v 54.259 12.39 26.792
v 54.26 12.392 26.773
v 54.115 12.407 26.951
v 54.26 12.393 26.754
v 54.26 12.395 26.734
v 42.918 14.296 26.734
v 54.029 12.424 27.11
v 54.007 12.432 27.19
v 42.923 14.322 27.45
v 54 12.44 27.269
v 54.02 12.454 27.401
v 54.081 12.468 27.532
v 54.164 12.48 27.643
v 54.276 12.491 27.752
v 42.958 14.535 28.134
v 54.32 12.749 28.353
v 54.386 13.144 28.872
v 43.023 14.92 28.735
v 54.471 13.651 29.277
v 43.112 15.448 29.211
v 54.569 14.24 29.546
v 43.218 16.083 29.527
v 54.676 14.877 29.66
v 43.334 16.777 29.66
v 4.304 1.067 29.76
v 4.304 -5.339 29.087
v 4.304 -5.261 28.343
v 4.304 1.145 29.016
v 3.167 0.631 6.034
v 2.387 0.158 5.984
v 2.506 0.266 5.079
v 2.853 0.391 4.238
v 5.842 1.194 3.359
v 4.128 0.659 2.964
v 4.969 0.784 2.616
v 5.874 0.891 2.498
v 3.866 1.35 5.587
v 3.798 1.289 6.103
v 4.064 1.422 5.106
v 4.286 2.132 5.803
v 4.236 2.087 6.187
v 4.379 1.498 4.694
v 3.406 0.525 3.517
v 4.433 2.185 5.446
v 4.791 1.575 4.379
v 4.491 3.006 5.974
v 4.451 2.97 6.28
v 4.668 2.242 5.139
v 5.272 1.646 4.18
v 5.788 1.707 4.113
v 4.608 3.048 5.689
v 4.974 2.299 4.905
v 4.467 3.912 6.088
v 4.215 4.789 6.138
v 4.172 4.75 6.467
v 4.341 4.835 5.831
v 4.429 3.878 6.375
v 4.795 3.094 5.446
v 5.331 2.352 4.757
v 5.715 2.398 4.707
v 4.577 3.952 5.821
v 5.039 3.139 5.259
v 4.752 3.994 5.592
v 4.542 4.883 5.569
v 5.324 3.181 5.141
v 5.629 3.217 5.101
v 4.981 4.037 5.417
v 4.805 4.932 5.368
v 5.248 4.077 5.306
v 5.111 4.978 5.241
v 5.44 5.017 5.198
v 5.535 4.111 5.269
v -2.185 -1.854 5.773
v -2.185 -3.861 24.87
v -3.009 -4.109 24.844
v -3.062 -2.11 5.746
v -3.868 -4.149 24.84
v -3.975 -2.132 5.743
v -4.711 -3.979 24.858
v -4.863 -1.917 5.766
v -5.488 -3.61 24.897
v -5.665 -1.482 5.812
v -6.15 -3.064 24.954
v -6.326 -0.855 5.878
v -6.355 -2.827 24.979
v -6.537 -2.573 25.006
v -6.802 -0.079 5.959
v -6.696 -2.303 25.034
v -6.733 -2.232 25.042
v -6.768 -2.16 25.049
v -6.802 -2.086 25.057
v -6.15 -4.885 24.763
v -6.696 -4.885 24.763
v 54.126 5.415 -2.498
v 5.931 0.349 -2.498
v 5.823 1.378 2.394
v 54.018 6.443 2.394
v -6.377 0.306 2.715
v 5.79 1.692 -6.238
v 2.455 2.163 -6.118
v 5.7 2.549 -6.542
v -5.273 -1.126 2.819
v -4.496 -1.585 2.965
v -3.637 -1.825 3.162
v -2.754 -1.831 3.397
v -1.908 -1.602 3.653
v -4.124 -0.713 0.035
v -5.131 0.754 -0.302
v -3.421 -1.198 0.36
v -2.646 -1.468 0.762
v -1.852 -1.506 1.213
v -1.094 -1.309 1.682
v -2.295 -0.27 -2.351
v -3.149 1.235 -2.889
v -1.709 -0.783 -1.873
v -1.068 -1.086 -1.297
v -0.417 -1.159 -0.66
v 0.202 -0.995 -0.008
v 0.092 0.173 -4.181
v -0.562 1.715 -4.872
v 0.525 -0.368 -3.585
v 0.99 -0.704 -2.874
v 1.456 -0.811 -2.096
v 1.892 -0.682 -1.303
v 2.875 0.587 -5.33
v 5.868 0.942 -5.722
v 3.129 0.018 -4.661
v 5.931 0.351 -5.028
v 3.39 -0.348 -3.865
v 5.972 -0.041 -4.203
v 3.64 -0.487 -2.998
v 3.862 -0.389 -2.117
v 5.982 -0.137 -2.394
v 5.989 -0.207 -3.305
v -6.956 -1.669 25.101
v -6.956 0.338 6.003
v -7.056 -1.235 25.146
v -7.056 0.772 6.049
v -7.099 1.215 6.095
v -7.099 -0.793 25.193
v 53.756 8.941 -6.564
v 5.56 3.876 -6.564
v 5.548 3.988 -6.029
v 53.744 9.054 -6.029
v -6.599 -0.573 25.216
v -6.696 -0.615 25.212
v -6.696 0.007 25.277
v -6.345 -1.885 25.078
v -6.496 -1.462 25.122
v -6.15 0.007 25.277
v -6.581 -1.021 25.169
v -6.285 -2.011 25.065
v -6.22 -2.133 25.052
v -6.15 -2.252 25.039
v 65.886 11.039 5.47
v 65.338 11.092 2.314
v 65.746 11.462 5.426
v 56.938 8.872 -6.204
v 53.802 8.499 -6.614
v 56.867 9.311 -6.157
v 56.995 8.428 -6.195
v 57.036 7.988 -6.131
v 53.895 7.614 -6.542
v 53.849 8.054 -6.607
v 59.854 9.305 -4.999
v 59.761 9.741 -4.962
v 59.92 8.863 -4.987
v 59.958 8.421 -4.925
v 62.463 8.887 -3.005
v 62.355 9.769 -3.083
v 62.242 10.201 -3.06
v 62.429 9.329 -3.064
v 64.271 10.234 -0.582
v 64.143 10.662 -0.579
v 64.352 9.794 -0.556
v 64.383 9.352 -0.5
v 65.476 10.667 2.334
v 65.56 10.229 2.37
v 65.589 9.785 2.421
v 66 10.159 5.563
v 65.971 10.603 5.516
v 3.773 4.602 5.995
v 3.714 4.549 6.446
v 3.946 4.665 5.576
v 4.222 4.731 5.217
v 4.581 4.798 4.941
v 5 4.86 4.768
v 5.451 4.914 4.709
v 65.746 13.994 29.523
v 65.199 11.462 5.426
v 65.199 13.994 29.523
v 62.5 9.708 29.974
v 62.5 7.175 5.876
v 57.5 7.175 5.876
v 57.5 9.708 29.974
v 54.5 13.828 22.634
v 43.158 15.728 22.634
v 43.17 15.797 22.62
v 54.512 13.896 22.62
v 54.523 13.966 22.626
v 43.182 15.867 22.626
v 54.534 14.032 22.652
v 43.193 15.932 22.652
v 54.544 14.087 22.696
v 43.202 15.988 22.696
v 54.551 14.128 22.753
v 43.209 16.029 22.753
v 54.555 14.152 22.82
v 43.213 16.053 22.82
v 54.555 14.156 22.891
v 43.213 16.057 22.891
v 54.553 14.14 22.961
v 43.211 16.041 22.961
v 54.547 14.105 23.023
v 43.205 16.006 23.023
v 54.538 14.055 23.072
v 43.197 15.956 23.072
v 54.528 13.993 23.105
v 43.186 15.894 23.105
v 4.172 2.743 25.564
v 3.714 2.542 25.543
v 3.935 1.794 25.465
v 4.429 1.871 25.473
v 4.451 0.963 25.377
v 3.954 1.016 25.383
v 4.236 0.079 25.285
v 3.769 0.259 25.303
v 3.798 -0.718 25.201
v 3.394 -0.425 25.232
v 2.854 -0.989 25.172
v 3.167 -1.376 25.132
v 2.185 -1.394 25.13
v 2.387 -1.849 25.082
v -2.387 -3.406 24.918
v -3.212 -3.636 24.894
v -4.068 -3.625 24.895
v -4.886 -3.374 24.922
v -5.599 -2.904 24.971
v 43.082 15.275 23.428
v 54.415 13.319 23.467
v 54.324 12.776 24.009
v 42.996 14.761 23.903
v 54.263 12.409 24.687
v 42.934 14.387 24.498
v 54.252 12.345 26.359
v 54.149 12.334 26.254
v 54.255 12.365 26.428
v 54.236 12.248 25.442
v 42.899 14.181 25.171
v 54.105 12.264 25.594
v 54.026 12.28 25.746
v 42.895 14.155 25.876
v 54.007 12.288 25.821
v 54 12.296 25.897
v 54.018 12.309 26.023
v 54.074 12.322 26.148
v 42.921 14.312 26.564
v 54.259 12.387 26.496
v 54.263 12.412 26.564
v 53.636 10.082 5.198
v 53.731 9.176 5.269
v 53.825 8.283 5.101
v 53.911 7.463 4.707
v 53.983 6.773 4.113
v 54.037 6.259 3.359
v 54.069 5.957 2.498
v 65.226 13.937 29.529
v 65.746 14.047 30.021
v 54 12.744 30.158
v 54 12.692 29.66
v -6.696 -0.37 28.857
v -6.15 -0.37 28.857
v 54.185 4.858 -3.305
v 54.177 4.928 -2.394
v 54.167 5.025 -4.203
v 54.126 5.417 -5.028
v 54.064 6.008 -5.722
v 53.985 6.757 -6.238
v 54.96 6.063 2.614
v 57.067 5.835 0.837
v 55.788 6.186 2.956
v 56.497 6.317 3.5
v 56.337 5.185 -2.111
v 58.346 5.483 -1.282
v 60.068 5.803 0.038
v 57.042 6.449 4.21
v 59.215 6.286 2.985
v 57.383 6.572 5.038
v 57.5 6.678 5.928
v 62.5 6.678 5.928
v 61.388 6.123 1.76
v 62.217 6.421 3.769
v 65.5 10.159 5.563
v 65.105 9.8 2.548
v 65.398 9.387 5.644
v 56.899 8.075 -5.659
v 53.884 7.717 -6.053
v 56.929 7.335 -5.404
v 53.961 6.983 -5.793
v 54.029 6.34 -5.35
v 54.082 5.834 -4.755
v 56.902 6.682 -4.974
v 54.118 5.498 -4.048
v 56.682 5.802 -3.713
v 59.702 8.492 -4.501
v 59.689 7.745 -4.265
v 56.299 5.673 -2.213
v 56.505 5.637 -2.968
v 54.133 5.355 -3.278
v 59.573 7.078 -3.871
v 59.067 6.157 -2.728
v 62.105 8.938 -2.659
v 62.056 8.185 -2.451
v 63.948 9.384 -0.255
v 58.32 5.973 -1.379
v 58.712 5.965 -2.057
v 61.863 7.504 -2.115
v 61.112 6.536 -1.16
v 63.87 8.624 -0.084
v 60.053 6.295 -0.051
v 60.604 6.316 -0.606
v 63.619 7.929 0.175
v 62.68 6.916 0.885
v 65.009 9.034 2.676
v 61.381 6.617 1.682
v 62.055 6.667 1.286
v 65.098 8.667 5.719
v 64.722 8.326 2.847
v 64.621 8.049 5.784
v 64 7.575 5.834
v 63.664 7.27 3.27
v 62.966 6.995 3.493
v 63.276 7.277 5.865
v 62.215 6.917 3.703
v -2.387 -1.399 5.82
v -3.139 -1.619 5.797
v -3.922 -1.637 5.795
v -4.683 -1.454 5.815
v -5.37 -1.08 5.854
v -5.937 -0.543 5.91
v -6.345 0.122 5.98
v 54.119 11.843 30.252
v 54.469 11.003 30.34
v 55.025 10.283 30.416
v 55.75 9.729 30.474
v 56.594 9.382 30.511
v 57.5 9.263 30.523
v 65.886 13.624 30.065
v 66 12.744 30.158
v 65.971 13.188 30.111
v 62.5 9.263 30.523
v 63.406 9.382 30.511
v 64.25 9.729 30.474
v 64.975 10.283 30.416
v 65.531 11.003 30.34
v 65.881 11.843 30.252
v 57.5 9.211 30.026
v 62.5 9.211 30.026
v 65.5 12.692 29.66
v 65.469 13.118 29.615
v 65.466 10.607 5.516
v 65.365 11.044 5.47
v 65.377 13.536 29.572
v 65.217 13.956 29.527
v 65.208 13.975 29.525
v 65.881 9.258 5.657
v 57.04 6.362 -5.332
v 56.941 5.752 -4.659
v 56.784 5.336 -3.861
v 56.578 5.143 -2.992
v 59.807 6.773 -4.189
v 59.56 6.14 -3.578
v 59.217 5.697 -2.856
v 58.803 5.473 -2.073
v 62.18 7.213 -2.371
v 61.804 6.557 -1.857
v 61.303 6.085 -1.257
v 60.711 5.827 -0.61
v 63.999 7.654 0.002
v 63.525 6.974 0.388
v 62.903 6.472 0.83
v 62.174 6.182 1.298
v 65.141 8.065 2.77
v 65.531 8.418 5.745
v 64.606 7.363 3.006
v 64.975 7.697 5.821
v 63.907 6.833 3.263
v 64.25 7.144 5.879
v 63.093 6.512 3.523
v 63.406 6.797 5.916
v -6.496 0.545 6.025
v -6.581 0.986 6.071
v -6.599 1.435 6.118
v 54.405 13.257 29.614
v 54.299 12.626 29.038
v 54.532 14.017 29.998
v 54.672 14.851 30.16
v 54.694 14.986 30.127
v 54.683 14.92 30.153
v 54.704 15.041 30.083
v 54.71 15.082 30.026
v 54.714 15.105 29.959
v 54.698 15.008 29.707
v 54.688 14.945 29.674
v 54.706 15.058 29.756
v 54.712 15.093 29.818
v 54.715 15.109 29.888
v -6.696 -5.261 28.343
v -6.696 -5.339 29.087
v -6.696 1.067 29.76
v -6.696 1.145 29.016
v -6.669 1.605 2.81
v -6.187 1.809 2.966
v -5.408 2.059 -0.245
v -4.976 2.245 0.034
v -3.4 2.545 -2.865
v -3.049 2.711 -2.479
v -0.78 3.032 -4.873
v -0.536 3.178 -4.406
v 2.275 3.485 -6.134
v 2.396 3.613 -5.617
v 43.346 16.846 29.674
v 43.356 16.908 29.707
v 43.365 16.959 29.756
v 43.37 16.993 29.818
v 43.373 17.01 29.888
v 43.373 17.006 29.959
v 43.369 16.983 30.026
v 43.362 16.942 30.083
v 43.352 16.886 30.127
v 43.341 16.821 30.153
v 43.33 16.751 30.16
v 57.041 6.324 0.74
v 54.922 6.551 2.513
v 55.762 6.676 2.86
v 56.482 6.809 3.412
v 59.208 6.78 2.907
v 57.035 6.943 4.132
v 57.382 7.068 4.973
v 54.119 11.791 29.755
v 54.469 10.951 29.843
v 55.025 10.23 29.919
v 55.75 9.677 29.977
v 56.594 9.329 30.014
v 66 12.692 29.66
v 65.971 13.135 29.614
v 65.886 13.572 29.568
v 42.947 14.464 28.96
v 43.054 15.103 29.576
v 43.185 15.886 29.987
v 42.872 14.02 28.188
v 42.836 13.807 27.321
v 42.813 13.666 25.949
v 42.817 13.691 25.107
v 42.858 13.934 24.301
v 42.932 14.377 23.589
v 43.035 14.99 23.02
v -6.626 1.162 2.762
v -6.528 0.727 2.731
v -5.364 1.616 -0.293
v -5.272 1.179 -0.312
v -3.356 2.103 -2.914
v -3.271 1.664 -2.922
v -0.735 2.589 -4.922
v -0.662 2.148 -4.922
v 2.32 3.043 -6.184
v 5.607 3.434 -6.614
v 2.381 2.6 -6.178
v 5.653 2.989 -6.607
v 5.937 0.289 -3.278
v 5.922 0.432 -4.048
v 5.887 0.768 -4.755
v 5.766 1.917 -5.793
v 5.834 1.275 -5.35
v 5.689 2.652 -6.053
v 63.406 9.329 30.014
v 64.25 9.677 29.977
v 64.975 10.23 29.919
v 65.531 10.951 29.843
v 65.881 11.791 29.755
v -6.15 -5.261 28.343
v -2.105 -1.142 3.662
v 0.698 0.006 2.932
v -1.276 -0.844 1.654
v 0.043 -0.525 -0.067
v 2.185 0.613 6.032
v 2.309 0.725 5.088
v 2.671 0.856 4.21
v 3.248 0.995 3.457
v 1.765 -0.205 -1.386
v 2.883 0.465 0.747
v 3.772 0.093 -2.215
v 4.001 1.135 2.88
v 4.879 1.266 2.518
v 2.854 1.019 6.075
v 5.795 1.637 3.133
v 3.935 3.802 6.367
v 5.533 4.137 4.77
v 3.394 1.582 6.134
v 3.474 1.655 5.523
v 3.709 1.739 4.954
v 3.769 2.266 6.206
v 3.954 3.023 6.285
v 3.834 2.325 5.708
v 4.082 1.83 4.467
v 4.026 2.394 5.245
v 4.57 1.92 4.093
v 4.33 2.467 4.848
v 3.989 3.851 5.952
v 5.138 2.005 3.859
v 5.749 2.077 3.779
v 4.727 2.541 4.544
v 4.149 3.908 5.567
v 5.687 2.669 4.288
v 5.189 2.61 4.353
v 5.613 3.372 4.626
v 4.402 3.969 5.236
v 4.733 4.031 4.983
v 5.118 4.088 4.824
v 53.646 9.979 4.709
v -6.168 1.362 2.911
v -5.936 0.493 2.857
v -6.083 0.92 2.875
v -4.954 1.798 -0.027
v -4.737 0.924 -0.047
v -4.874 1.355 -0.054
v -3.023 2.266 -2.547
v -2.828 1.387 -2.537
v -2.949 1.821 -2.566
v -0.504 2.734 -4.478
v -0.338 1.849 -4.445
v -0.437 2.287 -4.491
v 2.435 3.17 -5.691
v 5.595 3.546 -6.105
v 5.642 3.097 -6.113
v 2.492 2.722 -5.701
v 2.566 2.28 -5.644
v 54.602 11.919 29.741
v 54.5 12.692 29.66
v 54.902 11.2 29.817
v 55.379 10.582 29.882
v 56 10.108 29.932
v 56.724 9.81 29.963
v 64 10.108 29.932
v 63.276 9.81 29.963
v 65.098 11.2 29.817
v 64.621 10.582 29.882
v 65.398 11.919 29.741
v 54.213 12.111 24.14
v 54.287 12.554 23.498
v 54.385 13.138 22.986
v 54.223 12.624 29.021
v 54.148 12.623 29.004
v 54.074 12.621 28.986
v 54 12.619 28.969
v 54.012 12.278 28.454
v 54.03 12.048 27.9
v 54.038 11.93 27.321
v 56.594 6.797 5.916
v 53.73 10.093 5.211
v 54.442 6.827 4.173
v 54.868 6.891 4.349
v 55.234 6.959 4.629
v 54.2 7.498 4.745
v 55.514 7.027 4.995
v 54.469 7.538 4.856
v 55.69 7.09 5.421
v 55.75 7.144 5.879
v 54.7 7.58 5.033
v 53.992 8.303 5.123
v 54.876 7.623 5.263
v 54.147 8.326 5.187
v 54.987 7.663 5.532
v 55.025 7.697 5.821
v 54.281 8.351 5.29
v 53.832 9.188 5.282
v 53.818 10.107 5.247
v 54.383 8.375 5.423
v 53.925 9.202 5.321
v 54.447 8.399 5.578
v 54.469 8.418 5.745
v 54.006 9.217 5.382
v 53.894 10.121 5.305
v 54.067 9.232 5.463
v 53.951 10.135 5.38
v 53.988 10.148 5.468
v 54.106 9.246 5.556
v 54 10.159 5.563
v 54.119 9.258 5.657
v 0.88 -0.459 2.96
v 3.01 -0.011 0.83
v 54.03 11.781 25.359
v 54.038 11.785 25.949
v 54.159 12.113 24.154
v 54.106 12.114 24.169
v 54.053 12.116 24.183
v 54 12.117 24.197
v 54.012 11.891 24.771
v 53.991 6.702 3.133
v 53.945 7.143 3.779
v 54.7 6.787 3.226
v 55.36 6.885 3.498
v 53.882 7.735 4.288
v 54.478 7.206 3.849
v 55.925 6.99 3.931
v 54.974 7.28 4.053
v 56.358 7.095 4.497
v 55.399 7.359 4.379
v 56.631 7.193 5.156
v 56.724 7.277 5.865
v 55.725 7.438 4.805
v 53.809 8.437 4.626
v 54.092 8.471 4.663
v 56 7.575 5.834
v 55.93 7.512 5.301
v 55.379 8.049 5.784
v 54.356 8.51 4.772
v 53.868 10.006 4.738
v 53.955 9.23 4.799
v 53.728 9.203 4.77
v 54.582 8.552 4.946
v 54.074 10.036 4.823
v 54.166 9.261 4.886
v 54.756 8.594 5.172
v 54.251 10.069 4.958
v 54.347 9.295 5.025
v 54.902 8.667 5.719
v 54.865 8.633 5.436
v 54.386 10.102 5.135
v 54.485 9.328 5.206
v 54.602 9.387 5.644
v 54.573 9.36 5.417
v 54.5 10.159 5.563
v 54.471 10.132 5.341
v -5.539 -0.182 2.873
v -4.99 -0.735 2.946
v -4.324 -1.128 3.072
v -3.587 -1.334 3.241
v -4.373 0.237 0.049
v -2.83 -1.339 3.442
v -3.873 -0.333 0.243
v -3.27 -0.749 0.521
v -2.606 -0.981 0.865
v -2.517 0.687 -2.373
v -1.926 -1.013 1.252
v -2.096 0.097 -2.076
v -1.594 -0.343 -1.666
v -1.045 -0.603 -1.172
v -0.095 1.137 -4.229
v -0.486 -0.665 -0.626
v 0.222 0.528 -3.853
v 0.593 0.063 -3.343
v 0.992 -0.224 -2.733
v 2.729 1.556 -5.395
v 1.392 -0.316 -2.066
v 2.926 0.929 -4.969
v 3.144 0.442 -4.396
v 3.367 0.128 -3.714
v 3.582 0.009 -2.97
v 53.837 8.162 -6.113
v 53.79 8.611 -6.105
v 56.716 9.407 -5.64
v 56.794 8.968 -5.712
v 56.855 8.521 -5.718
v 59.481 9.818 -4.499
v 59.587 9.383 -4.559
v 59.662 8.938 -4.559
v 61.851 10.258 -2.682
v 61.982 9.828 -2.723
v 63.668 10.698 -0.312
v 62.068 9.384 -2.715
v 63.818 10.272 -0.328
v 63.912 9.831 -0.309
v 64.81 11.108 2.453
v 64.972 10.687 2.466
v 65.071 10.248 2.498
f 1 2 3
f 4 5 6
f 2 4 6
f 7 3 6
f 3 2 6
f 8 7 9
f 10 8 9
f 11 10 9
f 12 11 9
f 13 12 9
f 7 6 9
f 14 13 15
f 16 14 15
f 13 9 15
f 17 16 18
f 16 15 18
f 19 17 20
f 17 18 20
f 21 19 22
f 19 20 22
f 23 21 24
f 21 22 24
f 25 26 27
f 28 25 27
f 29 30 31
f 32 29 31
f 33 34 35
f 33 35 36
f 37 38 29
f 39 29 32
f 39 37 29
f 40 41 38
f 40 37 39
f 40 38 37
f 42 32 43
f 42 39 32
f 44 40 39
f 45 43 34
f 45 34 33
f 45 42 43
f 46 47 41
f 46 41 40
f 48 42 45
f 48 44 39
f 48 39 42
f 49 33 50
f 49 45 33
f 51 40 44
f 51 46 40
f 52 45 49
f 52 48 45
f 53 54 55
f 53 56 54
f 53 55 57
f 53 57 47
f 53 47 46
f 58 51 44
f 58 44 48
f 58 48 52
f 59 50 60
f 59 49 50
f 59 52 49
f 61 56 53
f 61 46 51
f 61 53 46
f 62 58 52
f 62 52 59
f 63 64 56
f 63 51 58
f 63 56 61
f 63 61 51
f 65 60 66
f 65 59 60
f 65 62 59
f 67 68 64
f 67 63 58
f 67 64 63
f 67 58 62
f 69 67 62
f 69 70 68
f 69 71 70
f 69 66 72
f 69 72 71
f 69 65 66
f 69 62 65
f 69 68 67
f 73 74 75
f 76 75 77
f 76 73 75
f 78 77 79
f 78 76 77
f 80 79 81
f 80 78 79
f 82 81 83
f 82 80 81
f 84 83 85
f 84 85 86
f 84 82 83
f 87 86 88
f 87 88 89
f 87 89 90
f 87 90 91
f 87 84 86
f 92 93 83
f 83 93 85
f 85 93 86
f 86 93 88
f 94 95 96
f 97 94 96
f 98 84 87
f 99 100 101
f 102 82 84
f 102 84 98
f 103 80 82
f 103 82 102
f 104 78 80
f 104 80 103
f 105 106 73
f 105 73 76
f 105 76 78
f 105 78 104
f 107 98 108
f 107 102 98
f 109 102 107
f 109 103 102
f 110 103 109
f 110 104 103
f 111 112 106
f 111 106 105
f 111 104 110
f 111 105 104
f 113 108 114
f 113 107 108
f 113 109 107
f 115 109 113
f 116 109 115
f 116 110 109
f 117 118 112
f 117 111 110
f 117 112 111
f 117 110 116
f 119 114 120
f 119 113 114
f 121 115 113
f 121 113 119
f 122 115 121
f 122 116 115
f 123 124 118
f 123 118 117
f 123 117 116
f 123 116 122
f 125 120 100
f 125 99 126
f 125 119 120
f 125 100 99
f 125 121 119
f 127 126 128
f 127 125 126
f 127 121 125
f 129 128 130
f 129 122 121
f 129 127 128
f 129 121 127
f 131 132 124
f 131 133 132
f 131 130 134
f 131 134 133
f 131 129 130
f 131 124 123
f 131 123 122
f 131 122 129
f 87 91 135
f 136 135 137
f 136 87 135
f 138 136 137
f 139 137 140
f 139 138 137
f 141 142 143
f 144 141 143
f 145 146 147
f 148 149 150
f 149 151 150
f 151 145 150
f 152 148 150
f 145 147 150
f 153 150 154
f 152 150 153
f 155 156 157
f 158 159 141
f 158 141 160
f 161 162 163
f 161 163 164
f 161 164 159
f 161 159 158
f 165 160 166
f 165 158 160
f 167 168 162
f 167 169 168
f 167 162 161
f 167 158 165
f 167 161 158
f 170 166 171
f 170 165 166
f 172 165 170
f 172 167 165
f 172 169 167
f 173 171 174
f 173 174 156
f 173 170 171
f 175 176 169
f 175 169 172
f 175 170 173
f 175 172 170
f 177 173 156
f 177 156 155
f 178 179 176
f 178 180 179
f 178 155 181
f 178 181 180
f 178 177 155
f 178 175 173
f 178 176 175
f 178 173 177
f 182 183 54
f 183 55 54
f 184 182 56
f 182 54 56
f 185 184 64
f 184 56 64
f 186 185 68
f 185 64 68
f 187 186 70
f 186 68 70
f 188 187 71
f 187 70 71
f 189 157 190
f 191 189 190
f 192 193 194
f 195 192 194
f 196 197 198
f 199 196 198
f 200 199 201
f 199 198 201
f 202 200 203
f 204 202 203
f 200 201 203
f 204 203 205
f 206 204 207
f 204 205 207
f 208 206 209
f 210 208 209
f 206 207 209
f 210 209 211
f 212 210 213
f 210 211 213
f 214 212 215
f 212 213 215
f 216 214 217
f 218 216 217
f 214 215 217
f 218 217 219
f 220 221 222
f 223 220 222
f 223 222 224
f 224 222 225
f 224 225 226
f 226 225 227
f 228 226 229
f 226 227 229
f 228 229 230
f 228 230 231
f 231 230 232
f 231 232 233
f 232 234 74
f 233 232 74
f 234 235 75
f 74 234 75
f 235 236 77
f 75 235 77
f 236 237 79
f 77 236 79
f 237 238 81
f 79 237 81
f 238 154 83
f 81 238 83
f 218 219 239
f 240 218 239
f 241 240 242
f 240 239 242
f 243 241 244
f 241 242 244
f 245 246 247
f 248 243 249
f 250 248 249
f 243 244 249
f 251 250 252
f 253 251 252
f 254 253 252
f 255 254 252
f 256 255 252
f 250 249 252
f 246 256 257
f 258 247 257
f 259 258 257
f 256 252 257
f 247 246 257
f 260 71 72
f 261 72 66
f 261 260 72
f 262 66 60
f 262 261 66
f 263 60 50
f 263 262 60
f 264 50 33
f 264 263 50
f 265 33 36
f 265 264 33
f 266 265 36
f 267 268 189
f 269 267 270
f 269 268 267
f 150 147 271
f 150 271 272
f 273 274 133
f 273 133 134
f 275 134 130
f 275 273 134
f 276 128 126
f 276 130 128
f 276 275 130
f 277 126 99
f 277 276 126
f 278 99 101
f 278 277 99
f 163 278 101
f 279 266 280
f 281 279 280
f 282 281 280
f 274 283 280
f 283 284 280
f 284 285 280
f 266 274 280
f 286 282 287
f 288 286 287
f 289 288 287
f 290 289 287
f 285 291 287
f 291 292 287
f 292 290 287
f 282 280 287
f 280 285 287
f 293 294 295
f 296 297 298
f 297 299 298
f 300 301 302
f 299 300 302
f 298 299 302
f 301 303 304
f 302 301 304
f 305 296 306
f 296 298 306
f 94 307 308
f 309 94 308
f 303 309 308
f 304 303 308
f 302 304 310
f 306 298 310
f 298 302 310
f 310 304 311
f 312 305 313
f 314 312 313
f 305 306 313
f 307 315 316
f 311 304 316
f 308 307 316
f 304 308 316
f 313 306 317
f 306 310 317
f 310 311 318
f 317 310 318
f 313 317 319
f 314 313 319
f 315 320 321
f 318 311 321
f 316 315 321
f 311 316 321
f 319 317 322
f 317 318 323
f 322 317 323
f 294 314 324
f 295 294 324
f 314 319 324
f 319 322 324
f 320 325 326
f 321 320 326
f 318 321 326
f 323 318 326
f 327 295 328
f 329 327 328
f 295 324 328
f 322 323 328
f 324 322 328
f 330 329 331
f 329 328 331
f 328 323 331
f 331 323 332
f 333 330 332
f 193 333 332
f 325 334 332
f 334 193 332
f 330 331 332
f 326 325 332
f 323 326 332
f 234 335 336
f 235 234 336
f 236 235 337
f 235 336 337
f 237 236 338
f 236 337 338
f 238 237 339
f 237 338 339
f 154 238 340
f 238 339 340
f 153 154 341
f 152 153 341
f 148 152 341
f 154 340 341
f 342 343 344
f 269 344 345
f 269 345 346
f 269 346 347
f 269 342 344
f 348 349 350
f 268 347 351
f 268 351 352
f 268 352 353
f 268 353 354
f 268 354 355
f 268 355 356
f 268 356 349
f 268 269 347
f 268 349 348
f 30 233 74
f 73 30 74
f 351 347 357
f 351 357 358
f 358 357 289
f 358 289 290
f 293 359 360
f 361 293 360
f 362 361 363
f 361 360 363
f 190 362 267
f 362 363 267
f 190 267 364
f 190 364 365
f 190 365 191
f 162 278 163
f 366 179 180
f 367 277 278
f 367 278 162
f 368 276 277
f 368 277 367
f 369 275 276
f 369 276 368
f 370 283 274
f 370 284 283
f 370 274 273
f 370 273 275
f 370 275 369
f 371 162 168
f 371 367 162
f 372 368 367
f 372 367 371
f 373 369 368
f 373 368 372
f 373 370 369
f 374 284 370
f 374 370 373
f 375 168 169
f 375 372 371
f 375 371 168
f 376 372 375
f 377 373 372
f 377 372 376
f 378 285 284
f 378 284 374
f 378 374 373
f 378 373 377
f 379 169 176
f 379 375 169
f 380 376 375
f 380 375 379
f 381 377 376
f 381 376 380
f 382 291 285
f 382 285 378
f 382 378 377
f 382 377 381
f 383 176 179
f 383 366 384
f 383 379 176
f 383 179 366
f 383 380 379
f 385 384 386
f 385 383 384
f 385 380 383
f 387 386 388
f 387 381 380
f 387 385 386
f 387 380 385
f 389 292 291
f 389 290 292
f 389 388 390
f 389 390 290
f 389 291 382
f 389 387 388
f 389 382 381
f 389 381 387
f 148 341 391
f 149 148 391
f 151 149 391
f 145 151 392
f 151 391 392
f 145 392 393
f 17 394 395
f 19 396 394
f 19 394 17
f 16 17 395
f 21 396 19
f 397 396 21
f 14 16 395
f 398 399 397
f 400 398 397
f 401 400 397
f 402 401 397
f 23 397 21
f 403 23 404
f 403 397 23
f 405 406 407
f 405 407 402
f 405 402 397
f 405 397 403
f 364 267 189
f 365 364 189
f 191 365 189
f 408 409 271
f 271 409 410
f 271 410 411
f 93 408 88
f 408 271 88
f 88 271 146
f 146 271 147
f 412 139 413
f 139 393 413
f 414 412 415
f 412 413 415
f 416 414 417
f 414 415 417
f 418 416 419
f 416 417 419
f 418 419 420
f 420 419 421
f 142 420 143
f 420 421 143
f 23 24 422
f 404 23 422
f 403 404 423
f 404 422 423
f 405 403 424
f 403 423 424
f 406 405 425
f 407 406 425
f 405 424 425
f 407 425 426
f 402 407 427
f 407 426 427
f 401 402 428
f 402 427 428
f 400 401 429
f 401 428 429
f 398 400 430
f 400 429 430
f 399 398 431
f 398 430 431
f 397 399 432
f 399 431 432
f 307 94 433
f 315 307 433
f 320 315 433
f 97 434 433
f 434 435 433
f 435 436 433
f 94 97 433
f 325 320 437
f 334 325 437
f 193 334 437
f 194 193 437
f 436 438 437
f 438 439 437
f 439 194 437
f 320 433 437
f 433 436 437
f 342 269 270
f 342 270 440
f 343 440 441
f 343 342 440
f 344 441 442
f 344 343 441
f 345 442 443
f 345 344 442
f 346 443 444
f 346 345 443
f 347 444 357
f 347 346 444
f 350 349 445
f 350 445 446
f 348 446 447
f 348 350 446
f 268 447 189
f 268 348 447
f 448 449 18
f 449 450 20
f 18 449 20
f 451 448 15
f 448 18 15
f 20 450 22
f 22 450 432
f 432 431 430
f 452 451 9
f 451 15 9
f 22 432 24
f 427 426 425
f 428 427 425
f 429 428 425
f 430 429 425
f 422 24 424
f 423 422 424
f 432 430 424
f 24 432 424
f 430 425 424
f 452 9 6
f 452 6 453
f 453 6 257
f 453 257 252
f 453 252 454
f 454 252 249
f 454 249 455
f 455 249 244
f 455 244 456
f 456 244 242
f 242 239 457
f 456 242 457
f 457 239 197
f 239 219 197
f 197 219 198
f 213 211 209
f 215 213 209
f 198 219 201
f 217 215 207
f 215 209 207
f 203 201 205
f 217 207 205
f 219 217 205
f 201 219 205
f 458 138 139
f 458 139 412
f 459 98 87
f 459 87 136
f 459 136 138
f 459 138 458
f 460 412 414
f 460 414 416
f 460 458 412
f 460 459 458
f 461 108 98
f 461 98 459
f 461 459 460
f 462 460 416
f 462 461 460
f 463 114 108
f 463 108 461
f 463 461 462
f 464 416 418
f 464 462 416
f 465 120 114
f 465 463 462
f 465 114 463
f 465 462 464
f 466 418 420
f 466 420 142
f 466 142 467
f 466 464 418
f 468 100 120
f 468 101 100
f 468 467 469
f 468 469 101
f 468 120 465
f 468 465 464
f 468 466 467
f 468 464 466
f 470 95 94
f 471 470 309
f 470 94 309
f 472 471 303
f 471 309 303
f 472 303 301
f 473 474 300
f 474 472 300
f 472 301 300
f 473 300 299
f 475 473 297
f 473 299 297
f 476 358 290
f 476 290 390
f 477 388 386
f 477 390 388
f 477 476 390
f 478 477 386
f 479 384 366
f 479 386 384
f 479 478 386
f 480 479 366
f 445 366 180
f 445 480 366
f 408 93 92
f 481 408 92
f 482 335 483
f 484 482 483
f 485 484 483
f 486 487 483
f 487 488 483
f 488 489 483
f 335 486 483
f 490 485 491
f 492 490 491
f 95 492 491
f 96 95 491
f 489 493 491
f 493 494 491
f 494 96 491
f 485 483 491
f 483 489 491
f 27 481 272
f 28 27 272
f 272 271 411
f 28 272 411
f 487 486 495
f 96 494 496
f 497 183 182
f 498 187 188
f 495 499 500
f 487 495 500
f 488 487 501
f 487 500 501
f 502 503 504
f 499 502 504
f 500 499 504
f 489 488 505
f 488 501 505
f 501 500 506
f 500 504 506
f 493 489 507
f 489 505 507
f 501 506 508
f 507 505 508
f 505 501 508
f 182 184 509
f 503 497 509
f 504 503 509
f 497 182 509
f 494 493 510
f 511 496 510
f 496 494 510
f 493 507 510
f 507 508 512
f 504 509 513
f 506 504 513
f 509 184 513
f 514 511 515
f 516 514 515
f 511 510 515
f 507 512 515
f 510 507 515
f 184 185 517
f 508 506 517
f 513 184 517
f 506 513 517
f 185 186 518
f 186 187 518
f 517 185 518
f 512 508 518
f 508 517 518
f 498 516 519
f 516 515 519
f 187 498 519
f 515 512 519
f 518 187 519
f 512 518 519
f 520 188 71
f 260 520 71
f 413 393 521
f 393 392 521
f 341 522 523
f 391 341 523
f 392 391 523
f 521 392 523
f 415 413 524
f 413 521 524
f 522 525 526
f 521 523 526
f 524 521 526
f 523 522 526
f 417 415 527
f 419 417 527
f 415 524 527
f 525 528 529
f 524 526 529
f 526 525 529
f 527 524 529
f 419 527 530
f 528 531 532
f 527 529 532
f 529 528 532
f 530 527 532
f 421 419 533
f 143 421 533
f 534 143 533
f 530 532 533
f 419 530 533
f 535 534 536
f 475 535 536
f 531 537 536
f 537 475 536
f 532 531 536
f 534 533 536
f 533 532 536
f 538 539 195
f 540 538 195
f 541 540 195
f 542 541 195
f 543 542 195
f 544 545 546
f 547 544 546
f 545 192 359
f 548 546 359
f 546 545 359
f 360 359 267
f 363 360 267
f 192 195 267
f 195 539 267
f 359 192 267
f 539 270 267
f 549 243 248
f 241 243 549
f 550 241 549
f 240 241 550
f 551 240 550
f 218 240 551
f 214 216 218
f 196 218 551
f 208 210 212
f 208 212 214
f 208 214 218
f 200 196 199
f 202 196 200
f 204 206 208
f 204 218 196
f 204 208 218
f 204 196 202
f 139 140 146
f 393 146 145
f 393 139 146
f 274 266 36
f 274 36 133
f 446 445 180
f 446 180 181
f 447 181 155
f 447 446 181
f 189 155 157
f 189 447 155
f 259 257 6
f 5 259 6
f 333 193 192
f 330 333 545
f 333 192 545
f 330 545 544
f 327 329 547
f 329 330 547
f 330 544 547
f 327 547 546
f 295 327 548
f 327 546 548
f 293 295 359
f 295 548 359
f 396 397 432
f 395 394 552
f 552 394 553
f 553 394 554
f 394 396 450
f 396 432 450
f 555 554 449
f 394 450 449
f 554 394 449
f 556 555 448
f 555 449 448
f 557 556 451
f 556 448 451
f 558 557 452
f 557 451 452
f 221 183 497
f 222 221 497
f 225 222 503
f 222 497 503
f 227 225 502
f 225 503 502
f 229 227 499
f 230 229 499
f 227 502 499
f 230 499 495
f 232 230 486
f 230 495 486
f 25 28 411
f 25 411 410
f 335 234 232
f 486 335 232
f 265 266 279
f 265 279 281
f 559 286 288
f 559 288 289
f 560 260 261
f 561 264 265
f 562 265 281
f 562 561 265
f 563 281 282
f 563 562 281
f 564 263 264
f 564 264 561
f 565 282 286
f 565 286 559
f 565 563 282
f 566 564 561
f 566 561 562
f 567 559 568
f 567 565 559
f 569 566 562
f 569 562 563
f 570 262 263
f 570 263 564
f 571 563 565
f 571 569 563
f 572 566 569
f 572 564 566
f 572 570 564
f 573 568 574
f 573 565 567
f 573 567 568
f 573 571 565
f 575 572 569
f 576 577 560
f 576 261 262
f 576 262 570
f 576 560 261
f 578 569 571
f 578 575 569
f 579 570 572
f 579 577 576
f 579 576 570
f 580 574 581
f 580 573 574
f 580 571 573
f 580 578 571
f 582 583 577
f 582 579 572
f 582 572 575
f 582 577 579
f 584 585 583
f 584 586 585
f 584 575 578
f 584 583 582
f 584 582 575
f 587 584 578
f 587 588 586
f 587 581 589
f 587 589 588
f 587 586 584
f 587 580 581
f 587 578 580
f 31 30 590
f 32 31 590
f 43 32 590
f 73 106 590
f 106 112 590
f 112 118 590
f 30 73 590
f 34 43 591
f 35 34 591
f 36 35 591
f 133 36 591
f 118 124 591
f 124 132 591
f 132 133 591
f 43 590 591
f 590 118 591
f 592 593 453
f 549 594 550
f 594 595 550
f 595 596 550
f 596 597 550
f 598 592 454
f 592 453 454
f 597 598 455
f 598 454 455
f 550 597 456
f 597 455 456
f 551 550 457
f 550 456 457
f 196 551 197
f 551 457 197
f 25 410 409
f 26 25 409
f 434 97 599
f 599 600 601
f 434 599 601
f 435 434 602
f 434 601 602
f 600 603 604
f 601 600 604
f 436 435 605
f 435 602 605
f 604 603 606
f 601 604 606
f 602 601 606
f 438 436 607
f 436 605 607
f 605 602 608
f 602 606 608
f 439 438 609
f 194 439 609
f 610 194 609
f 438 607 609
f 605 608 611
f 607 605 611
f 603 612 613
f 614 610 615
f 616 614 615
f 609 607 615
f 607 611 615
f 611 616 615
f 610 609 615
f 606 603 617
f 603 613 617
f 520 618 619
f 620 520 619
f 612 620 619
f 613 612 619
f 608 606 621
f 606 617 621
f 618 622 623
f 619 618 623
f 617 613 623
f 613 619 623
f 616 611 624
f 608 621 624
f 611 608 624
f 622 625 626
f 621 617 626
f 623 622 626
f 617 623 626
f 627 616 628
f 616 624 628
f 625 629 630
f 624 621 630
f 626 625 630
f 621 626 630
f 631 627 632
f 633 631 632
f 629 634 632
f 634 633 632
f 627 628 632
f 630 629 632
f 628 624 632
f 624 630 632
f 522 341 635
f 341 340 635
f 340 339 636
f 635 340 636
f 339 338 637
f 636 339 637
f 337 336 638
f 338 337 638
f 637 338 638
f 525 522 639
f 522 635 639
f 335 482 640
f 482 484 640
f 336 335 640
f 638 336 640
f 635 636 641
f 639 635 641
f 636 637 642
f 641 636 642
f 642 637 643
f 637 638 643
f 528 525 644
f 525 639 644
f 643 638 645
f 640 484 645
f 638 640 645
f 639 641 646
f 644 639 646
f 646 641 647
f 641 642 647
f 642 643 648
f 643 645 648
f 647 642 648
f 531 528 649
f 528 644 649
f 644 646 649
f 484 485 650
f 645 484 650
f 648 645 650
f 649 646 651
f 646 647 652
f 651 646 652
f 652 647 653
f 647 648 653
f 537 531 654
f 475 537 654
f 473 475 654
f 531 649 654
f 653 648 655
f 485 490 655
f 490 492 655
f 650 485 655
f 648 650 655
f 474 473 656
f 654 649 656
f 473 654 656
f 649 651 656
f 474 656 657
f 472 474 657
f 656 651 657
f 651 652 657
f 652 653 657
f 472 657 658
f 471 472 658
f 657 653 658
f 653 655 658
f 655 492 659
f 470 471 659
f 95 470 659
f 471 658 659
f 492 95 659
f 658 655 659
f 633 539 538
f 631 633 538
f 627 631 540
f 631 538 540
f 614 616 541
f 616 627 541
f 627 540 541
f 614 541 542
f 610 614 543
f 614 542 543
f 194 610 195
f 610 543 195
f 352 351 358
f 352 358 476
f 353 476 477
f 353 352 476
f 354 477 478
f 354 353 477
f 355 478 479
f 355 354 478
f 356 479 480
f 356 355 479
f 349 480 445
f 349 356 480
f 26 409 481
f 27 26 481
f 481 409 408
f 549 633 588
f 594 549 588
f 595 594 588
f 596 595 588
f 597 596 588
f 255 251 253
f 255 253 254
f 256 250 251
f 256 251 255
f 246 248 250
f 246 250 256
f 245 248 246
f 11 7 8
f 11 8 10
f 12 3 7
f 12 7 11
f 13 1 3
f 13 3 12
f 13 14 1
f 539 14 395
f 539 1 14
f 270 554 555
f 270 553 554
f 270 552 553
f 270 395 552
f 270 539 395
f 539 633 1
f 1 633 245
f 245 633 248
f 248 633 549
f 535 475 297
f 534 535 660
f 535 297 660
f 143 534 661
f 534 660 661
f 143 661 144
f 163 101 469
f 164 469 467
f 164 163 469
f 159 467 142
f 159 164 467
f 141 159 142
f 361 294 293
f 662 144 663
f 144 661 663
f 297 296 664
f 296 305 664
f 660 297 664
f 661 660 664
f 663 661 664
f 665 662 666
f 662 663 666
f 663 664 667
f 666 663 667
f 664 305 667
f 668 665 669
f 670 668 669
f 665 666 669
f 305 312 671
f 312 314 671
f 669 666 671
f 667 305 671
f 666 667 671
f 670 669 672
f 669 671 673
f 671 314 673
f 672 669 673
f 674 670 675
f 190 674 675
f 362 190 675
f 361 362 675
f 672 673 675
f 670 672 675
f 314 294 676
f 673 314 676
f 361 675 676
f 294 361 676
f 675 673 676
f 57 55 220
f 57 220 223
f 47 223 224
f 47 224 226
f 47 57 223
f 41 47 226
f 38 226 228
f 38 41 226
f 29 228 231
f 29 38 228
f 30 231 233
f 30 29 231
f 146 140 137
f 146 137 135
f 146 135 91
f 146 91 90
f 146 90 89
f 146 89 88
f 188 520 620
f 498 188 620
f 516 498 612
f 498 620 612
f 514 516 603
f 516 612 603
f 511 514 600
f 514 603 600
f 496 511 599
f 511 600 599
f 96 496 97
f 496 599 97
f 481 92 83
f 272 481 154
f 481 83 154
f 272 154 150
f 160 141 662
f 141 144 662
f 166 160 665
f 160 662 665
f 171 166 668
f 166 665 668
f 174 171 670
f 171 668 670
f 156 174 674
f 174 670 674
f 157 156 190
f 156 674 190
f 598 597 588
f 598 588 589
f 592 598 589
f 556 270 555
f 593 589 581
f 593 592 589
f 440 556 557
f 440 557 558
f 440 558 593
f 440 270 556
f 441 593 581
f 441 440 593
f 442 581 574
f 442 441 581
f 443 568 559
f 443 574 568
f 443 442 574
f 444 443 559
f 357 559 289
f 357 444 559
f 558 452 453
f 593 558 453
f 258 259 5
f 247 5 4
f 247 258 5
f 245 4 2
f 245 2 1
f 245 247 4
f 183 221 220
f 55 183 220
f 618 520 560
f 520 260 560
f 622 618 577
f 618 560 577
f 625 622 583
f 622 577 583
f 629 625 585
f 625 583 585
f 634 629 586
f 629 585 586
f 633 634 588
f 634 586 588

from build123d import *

# Parameters (mm, degrees)
SKETCH_2_W      = 0.546487167
SKETCH_2_H      = 4.918384508
EXTRUDE_1_DEPTH = 3.6
EXTRUDE_2_DEPTH = 11
EXTRUDE_START   = 0.5
EXTRUDE_4_DEPTH = 0.5
EXTRUDE_5_DEPTH = 11.5


with BuildPart() as part:
    # 扫描1: sweep along a curve in space
    with BuildLine() as sweep_1_path:
        Line((60, 6.926609333, 5.902285627), (60, 9.459381174, 30))
        ThreePointArc((54.097714373, 5.685898899, 0), (58.275153099, 6.306254116, 1.724846901), (60, 6.926609333, 5.902285627))
        Line((5.902285627, 0.620355217, 0), (54.097714373, 5.685898899, 0))
        ThreePointArc((0, -0.620355217, 5.902285627), (1.724846901, 0, 1.724846901), (5.902285627, 0.620355217, 0))
        Line((0, -0.620355217, 5.902285627), (0, -2.627605882, 25))
    # 草图1 → 扫描1 (sweep)
    with BuildSketch(Plane(origin=(60, 9.459381174, 30), x_dir=(1, 0, 0), z_dir=(0, 0.10452846326765572, 0.9945218953682732))):
        with BuildLine():
            Line((-6, 3.25), (-5.5, 3.25))
            ThreePointArc((-5.5, 3.25), (-4.621320344, 1.128679656), (-2.5, 0.25))
            Line((-2.5, 0.25), (2.5, 0.25))
            ThreePointArc((2.5, 0.25), (4.621320344, 1.128679656), (5.5, 3.25))
            ThreePointArc((5.5, 3.25), (5.42374237, 3.922109036), (5.198846296, 4.56004911))
            Line((5.198846296, 4.56004911), (5.745577195, 4.56004911))
            ThreePointArc((5.745577195, 4.56004911), (5.935805596, 3.917262998), (6, 3.25))
            ThreePointArc((6, 3.25), (4.974873734, 0.775126266), (2.5, -0.25))
            Line((2.5, -0.25), (-2.5, -0.25))
            ThreePointArc((-2.5, -0.25), (-4.974873734, 0.775126266), (-6, 3.25))
        make_face()
    sweep(path=sweep_1_path.line)

    # 草图2 → 凸台-拉伸1 (add)
    with BuildSketch(Plane(origin=(0, -2.627605882, 25), x_dir=(1, 0, 0), z_dir=(0, -0.1045284632676537, 0.9945218953682733))):
        with Locations((-6.423000936, 0.189458264)):
            Rectangle(SKETCH_2_W, SKETCH_2_H)
    extrude(amount=EXTRUDE_1_DEPTH)

    # 草图3 → 凸台-拉伸2 (add)
    with BuildSketch(Plane.ZY.offset(6.696244519)):
        Polygon((28.343027017, -5.261208499), (29.016349178, 1.145023935), (29.760098321, 1.06685275), (29.08677616, -5.339379684), align=None)
    extrude(amount=-EXTRUDE_2_DEPTH)

    # 草图5 → 凸台-拉伸4 (add)
    with BuildSketch(Plane(origin=(0, 3.222030449, 30.655571978), x_dir=(1, 0, 0), z_dir=(0, 0.10452846326765573, 0.9945218953682732)).offset(EXTRUDE_START)):
        with BuildLine():
            Line((65.745577195, 10.831756906), (54, 9.521707796))
            ThreePointArc((54, 9.521707796), (55.025126266, 7.046834062), (57.5, 6.021707796))
            Line((57.5, 6.021707796), (62.5, 6.021707796))
            ThreePointArc((62.5, 6.021707796), (64.974873734, 7.046834062), (66, 9.521707796))
            ThreePointArc((66, 9.521707796), (65.935805596, 10.188970794), (65.745577195, 10.831756906))
        make_face()
    extrude(amount=-EXTRUDE_4_DEPTH)

    # 草图6 → 凸台-拉伸5 (add)
    with BuildSketch(Plane(origin=(42.920636483, 14.309369815, 26.591437724), x_dir=(0, 0, 1), z_dir=(-0.9862492496089712, 0.16526468965190708, -2.582698329999371e-13))):
        with BuildLine():
            ThreePointArc((3.06884477, 2.502193657), (3.331726952, 2.738610574), (3.568143869, 2.475728392))
            ThreePointArc((3.568143869, 2.475728392), (2.699777506, 0.459022922), (0.729316838, -0.509711228))
            Line((0.729316838, -0.509711228), (-0.642859848, -0.651949655))
            ThreePointArc((-0.642859848, -0.651949655), (-2.66156717, -0.179875455), (-3.957168488, 1.438596209))
            ThreePointArc((-3.957168488, 1.438596209), (-3.805502668, 1.75796665), (-3.486132226, 1.606300829))
            ThreePointArc((-3.486132226, 1.606300829), (-2.093455907, 0.078991816), (-0.027928349, 0.002728684))
            Line((-0.027928349, 0.002728684), (0.142811981, -0.013953159))
            ThreePointArc((0.142811981, -0.013953159), (2.143390616, 0.618987912), (3.06884477, 2.502193657))
        make_face()
    extrude(amount=-EXTRUDE_5_DEPTH)


solid = part.part
